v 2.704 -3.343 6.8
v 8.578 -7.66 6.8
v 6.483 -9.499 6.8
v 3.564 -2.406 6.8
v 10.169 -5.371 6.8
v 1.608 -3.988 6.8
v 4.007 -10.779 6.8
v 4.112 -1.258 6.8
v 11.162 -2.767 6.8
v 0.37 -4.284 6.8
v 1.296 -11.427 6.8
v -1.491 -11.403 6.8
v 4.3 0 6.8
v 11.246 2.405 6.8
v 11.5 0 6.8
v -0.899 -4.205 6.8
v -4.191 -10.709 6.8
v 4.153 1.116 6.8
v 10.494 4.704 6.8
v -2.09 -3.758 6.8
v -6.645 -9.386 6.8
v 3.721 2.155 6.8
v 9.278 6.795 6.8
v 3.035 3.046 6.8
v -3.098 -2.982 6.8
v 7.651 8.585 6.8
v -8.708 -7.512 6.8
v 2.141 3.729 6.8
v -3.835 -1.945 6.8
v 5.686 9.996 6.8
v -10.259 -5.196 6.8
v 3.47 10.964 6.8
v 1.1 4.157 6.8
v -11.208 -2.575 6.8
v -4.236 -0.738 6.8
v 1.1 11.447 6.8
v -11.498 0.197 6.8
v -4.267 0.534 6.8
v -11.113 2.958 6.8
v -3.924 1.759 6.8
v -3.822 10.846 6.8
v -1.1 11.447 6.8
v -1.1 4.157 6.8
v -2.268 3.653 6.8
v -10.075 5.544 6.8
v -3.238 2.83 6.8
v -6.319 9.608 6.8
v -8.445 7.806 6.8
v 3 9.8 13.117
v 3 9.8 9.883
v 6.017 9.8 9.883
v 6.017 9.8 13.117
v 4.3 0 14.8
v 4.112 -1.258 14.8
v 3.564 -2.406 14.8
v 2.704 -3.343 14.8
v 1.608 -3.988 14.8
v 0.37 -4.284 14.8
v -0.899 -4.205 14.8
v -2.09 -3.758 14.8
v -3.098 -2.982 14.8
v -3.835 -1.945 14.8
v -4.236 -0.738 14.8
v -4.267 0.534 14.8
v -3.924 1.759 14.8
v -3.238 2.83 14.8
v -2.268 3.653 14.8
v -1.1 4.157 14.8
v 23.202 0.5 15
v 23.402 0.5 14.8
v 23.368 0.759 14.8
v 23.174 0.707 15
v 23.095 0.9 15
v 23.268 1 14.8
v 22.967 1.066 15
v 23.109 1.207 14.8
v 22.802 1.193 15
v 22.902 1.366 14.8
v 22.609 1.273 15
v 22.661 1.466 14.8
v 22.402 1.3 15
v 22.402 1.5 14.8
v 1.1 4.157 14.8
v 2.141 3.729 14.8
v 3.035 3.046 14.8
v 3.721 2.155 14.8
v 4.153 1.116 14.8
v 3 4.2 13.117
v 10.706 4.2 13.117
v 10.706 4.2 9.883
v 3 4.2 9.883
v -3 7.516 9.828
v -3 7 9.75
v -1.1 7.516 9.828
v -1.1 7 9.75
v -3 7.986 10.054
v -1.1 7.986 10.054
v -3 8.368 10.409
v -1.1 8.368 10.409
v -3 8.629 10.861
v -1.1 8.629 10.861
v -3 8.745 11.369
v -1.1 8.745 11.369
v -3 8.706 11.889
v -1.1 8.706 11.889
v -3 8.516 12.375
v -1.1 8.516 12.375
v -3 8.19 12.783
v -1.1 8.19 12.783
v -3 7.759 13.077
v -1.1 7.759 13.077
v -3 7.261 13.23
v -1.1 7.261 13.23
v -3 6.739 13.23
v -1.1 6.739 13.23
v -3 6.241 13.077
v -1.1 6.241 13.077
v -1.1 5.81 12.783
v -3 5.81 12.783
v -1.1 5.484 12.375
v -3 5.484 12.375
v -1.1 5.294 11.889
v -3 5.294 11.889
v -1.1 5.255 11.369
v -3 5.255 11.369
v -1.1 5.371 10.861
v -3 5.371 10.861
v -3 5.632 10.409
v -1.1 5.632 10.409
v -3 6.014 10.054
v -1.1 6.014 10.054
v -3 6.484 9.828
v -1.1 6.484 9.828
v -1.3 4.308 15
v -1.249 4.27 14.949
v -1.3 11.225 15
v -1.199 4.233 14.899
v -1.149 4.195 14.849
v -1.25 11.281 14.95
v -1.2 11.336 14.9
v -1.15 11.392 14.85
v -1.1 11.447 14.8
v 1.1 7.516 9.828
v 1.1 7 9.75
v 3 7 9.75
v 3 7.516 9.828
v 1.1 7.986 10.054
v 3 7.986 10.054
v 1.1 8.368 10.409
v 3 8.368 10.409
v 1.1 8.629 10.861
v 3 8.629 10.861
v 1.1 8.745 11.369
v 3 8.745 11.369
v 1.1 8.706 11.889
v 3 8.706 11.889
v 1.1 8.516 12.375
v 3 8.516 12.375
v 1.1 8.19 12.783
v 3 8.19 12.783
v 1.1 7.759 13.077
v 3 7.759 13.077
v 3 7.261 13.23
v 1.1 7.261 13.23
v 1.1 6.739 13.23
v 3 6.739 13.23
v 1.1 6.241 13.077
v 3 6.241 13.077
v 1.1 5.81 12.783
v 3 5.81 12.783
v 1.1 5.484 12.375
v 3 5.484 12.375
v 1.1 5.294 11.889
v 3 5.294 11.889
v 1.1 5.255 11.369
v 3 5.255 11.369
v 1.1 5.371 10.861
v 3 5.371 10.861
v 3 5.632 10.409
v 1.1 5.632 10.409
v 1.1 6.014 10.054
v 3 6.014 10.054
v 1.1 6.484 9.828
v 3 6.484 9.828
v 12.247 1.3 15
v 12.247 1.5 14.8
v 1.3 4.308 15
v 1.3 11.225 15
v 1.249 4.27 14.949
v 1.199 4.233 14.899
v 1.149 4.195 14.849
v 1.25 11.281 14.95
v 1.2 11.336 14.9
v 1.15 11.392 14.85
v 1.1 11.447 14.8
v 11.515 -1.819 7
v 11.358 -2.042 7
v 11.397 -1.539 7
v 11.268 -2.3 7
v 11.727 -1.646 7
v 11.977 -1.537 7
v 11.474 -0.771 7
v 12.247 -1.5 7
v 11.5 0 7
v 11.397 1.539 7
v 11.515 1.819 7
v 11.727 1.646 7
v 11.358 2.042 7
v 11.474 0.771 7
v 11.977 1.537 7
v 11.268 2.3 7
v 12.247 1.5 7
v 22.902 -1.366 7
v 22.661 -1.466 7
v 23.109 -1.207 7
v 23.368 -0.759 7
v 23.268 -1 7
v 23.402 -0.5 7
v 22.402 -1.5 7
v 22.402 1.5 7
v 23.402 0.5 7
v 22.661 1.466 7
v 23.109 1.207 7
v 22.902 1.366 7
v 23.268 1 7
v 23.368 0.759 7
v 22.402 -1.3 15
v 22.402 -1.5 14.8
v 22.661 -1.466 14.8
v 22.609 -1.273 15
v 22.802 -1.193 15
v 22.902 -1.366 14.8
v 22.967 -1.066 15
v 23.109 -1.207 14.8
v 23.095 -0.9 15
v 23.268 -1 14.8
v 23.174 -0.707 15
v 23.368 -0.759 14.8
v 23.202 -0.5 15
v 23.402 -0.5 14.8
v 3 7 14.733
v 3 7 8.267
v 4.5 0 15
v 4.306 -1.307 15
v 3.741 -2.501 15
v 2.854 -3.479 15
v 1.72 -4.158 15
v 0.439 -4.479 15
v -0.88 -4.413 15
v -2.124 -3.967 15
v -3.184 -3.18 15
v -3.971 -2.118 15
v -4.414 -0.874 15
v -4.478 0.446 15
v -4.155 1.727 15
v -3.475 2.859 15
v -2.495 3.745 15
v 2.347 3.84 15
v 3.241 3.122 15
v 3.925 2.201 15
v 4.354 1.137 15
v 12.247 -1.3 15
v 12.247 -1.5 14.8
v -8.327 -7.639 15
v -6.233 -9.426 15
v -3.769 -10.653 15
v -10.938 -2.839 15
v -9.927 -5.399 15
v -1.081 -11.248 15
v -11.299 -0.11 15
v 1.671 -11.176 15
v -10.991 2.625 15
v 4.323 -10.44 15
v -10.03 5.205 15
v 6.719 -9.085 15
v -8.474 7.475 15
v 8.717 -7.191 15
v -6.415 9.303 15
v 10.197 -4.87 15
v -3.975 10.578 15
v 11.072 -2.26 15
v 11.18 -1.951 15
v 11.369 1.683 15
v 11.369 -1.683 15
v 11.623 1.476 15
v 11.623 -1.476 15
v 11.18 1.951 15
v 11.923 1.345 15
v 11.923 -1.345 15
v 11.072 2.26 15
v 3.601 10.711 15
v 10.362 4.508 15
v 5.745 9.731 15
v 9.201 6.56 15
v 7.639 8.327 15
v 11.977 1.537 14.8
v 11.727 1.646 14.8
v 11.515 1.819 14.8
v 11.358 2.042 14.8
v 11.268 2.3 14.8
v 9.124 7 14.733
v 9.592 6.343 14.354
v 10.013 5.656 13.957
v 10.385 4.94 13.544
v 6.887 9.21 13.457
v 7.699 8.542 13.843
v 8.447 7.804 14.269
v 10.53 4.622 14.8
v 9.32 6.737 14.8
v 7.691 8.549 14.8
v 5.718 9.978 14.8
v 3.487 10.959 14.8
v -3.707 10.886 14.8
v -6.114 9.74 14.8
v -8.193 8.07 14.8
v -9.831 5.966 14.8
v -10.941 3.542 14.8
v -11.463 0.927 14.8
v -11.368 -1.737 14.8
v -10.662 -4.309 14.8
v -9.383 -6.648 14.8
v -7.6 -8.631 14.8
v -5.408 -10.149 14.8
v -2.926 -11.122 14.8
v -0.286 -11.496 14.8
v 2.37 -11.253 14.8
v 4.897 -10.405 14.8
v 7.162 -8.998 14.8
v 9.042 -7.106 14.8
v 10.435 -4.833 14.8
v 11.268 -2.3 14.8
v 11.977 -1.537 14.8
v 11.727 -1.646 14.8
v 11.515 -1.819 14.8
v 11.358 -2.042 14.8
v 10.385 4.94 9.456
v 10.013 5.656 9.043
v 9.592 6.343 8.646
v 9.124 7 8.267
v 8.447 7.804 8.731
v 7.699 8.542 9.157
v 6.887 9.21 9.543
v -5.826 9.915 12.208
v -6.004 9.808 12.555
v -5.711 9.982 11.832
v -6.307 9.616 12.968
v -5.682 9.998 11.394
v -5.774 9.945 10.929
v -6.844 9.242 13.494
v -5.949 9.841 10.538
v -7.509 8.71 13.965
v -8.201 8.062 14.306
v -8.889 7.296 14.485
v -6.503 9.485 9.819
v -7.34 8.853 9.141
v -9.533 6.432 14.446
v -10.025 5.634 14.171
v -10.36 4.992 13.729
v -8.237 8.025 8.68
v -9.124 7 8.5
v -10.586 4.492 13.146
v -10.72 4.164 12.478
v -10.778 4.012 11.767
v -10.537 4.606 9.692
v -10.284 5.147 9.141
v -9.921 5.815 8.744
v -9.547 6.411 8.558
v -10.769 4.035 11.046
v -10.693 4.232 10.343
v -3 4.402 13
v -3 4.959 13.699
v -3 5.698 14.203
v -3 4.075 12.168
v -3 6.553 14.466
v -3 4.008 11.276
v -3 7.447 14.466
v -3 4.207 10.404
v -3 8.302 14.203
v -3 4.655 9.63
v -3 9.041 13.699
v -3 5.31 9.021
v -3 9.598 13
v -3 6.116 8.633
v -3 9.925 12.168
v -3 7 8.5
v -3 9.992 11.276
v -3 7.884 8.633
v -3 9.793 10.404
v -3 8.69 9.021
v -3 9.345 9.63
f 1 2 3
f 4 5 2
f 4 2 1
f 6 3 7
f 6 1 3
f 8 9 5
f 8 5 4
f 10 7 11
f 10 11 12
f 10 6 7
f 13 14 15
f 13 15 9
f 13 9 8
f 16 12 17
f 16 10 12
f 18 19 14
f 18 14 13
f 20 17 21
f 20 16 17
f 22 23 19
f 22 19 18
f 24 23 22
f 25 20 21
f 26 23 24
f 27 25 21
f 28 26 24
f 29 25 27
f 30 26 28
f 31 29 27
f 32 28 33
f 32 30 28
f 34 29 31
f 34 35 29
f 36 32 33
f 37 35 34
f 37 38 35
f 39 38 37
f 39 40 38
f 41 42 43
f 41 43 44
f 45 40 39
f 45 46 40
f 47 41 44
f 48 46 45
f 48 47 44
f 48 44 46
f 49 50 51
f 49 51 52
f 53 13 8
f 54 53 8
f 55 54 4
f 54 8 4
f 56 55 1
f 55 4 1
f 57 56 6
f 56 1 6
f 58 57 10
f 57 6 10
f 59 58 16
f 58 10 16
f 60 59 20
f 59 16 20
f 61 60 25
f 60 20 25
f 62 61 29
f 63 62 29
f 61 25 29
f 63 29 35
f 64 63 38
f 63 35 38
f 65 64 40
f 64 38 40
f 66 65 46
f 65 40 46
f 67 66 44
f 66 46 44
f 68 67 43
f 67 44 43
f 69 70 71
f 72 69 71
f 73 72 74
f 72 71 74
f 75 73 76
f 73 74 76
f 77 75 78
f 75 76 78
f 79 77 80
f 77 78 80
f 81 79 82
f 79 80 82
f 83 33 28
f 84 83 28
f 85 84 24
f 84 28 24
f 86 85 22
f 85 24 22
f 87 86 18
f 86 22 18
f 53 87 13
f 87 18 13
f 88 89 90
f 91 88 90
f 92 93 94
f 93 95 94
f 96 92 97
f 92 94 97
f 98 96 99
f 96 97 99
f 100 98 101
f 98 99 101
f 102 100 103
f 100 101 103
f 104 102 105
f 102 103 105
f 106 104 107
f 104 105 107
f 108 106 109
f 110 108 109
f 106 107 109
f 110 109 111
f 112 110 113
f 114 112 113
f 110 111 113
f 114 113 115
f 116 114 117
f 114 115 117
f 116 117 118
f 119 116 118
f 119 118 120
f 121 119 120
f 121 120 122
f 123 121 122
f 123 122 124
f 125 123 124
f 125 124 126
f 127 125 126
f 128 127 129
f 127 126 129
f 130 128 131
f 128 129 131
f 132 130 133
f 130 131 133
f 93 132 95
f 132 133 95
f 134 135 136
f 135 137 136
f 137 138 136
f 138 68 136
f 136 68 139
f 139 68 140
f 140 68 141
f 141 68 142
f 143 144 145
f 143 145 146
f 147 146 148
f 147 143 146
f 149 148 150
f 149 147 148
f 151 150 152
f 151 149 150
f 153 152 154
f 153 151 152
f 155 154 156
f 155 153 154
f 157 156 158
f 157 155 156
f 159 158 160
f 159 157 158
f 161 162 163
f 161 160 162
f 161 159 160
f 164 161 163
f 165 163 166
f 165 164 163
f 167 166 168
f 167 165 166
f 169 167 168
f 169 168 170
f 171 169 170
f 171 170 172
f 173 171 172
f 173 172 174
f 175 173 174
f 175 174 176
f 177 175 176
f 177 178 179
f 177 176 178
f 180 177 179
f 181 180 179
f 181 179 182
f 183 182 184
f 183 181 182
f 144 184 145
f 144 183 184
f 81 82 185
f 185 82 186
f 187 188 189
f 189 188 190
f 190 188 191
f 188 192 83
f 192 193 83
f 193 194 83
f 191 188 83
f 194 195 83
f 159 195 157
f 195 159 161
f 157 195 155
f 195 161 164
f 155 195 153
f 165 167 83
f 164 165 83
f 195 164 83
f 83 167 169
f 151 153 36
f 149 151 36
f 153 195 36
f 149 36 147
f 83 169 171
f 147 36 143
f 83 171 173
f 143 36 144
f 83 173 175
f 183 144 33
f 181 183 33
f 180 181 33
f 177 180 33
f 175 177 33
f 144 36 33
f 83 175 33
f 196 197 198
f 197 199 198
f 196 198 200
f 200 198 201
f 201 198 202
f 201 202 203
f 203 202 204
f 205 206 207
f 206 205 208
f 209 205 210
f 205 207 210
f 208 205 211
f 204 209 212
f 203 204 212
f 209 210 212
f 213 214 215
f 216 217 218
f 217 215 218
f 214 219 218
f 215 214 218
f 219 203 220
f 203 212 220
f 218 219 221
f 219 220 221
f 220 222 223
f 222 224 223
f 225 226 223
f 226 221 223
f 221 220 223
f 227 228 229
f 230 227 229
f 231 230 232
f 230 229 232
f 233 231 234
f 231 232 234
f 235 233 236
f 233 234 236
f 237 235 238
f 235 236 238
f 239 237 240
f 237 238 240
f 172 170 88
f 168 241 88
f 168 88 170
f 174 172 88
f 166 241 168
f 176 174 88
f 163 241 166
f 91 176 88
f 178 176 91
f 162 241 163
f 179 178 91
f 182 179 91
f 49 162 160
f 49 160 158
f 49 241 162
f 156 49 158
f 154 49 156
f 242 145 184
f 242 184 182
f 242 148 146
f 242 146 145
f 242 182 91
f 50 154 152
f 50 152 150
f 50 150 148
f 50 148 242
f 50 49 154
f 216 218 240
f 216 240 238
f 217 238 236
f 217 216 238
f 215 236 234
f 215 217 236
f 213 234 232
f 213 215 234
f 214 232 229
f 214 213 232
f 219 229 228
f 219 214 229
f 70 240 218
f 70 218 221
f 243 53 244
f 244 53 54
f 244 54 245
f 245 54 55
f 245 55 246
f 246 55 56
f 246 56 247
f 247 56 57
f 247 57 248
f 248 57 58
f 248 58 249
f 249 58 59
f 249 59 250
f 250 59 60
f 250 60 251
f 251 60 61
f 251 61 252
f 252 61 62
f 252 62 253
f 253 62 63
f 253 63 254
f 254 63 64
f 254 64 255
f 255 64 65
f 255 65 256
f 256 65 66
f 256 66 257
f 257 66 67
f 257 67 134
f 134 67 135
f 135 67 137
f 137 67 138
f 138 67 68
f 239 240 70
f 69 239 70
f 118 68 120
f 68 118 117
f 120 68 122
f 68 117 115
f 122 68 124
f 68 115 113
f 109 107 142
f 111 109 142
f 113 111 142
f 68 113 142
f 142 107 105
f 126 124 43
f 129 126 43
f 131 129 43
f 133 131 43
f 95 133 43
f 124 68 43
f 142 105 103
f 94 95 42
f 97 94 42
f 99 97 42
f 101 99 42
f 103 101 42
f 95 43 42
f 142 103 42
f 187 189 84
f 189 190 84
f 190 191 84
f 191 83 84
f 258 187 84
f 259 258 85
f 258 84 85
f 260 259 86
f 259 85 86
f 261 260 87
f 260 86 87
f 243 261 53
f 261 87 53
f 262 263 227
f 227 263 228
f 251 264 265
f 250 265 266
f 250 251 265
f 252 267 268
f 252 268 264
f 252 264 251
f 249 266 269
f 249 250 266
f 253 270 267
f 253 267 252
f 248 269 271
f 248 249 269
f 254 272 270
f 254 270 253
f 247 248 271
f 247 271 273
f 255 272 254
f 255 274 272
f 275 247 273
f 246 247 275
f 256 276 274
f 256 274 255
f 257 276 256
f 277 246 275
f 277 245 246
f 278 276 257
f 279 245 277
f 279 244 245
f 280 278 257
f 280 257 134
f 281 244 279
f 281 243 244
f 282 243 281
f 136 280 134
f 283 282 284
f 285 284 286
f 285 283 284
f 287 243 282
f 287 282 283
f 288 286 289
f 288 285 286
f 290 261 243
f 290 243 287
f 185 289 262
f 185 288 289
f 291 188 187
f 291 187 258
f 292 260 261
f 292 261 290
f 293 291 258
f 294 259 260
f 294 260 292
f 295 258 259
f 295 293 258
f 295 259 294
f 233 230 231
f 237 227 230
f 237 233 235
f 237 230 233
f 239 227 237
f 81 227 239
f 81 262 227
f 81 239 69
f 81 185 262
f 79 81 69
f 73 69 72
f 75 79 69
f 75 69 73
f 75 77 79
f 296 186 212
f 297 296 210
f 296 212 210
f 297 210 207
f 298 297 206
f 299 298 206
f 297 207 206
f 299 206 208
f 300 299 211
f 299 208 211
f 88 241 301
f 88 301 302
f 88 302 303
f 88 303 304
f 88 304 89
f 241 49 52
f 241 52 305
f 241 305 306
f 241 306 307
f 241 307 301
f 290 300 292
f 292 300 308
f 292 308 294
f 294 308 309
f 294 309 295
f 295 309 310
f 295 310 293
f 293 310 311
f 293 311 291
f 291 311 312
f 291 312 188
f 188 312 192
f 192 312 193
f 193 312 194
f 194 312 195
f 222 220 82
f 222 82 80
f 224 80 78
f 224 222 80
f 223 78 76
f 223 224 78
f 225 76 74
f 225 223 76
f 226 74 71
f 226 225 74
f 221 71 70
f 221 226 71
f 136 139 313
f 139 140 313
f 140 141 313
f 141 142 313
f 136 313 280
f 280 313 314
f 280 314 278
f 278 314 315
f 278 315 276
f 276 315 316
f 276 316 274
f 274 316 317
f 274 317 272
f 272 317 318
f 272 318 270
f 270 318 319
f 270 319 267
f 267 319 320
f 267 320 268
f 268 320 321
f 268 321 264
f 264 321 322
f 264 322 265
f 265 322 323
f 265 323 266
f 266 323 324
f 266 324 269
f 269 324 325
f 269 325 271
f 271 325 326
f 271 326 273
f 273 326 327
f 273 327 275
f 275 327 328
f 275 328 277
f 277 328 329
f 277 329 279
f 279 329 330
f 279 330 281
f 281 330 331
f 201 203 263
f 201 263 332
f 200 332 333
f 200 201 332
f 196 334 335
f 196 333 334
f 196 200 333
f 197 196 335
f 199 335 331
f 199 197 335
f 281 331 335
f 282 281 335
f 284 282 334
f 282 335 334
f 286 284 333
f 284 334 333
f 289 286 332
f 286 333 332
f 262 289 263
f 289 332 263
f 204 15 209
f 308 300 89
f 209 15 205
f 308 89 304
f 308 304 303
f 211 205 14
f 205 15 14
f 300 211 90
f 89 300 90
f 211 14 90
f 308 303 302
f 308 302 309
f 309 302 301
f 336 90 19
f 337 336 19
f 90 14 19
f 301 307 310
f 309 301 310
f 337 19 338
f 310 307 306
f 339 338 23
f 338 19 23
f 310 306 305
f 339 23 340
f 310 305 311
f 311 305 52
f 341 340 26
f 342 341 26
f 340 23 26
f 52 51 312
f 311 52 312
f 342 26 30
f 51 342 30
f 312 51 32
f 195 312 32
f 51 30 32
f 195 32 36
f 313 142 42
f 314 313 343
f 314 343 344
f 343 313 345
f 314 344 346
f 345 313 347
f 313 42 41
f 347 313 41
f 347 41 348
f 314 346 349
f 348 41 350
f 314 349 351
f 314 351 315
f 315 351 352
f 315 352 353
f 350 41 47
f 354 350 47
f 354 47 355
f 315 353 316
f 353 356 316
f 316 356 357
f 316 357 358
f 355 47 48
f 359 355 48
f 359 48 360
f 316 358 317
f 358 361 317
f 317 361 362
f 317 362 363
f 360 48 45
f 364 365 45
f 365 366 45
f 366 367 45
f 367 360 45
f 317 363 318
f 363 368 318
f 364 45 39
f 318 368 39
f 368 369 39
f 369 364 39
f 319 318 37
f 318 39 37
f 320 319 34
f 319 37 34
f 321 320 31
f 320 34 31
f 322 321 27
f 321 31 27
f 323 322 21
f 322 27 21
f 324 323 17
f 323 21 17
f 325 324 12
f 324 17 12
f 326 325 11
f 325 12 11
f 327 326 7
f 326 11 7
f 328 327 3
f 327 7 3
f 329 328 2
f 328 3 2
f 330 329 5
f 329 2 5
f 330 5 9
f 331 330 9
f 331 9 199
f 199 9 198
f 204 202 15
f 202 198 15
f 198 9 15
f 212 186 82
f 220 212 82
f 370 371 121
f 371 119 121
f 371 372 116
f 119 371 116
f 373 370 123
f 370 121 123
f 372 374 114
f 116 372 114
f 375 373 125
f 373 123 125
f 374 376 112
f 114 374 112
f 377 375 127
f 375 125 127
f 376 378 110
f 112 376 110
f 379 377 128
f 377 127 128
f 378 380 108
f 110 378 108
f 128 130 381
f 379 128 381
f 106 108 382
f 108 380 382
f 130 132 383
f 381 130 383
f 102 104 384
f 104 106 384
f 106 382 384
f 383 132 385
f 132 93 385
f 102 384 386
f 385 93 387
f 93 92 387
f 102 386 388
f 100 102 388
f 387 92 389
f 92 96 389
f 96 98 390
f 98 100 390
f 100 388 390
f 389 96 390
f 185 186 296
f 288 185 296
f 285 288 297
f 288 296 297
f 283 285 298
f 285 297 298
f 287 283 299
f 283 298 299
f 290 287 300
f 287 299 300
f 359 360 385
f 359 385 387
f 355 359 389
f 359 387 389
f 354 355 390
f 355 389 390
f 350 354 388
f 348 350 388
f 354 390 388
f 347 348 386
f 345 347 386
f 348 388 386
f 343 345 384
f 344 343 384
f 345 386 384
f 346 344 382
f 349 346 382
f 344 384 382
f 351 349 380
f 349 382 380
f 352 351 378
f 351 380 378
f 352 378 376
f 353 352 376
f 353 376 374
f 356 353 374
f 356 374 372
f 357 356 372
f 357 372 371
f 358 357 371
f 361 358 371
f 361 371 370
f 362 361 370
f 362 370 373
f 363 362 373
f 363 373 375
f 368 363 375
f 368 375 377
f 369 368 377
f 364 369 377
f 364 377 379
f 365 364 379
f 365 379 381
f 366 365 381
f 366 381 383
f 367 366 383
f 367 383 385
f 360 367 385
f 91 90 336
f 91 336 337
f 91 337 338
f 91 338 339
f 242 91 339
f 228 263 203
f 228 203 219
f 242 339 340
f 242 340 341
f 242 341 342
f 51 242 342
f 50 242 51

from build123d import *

# Parameters (mm, degrees)
BOSS_EXTRUDE1_DEPTH     = 15
CUT_EXTRUDE4_START      = -3
SKETCH4_R               = 3
SKETCH4_R_2             = 1.75
CUT_EXTRUDE4_DEPTH      = 15
SKETCH4_2_R             = 1.75
CUT_EXTRUDE5_DEPTH      = 12.5000001
CUT_EXTRUDE5_DEPTH_BACK = 12.5000001
CUT_EXTRUDE6_START      = 3
CUT_EXTRUDE6_DEPTH      = 15
SKETCH6_R               = 14
CUT_EXTRUDE7_DEPTH      = 6.8
SKETCH7_W               = 12
SKETCH7_H               = 3
BOSS_EXTRUDE2_DEPTH     = 8
FILLET1_R               = 1
CHAMFER2_SIZE           = 0.2


with BuildPart() as part:
    # Sketch1 → Boss-Extrude1 (new body)
    with BuildSketch(Plane.XY):
        with BuildLine():
            Line((1.1, 11.447270417), (1.1, 4.156921938))
            ThreePointArc((1.1, 4.156921938), (3.407345007, 2.62297541), (4.3, 0))
            ThreePointArc((4.3, 0), (-2.62297541, -3.407345007), (-1.1, 4.156921938))
            Line((-1.1, 4.156921938), (-1.1, 11.447270417))
            ThreePointArc((-1.1, 11.447270417), (-7.733045972, -8.511756575), (11.5, 0))
            ThreePointArc((11.5, 0), (8.511756575, 7.733045972), (1.1, 11.447270417))
        make_face()
    extrude(amount=BOSS_EXTRUDE1_DEPTH)

    # Sketch4 → Cut-Extrude4 (cut)
    with BuildSketch(Plane(origin=(0, 0, 0), x_dir=(0, 0, -1), z_dir=(1, 0, 0)).offset(CUT_EXTRUDE4_START)):
        with Locations((-11.5, 7)):
            Circle(SKETCH4_R)
        with Locations((-11.5, 7)):
            Circle(SKETCH4_R_2, mode=Mode.SUBTRACT)
        with Locations((-3.5, 7)):
            Circle(SKETCH4_R)
        with Locations((-3.5, 7)):
            Circle(SKETCH4_R_2, mode=Mode.SUBTRACT)
    extrude(amount=-CUT_EXTRUDE4_DEPTH, mode=Mode.SUBTRACT)

    # Sketch4_2 → Cut-Extrude5 (cut, two sides)
    with BuildSketch(Plane(origin=(0, 0, 0), x_dir=(0, 0, -1), z_dir=(1, 0, 0))) as cut_extrude5_sk:
        with Locations((-11.5, 7)):
            Circle(SKETCH4_2_R)
        with Locations((-3.5, 7)):
            Circle(SKETCH4_2_R)
    extrude(amount=CUT_EXTRUDE5_DEPTH, mode=Mode.SUBTRACT)
    extrude(cut_extrude5_sk.sketch, amount=-CUT_EXTRUDE5_DEPTH_BACK, mode=Mode.SUBTRACT)

    # Sketch5 → Cut-Extrude6 (cut)
    with BuildSketch(Plane(origin=(0, 0, 0), x_dir=(0, 0, -1), z_dir=(1, 0, 0)).offset(CUT_EXTRUDE6_START)):
        Polygon((-9.883419246, 9.8), (-13.116580754, 9.8), (-14.733161507, 7), (-13.116580754, 4.2), (-9.883419246, 4.2), (-8.266838493, 7), align=None)
        Polygon((-1.883419246, 9.8), (-5.116580754, 9.8), (-6.733161507, 7), (-5.116580754, 4.2), (-1.883419246, 4.2), (-0.266838493, 7), align=None)
    extrude(amount=CUT_EXTRUDE6_DEPTH, mode=Mode.SUBTRACT)

    # Sketch6 → Cut-Extrude7 (cut)
    with BuildSketch(Plane(origin=(0, 0, 0), x_dir=(-1, 0, 0), z_dir=(0, 0, -1))):
        Circle(SKETCH6_R)
    extrude(amount=-CUT_EXTRUDE7_DEPTH, mode=Mode.SUBTRACT)

    # Sketch7 → Boss-Extrude2 (add)
    with BuildSketch(Plane.XY.offset(15)):
        with Locations((17.401754251, 0)):
            Rectangle(SKETCH7_W, SKETCH7_H)
    extrude(amount=-BOSS_EXTRUDE2_DEPTH)

    # Fillet1
    fillet1_edges = [part.edges().sort_by_distance(p)[0] for p in [
        (11.401754251, -1.5, 11),
        (11.401754251, 1.5, 11),
        (23.401754251, 1.5, 11),
        (23.401754251, -1.5, 11),
    ]]
    fillet(fillet1_edges, radius=FILLET1_R)

    # Chamfer2
    chamfer2_edges = [part.edges().sort_by_distance(p)[0] for p in [
        (-8.549394828, -7.691413919, 15),
        (23.401754251, 0, 15),
        (17.324601482, -1.5, 15),
        (17.324601482, 1.5, 15),
        (7.691413919, 8.549394828, 15),
        (23.108861032, -1.207106781, 15),
        (23.108861032, 1.207106781, 15),
        (11.614993182, -1.725403331, 15),
        (11.614993182, 1.725403331, 15),
        (1.1, 7.802096178, 15),
        (0, -4.3, 15),
        (-1.1, 7.802096178, 15),
    ]]
    chamfer(chamfer2_edges, length=CHAMFER2_SIZE)


solid = part.part
